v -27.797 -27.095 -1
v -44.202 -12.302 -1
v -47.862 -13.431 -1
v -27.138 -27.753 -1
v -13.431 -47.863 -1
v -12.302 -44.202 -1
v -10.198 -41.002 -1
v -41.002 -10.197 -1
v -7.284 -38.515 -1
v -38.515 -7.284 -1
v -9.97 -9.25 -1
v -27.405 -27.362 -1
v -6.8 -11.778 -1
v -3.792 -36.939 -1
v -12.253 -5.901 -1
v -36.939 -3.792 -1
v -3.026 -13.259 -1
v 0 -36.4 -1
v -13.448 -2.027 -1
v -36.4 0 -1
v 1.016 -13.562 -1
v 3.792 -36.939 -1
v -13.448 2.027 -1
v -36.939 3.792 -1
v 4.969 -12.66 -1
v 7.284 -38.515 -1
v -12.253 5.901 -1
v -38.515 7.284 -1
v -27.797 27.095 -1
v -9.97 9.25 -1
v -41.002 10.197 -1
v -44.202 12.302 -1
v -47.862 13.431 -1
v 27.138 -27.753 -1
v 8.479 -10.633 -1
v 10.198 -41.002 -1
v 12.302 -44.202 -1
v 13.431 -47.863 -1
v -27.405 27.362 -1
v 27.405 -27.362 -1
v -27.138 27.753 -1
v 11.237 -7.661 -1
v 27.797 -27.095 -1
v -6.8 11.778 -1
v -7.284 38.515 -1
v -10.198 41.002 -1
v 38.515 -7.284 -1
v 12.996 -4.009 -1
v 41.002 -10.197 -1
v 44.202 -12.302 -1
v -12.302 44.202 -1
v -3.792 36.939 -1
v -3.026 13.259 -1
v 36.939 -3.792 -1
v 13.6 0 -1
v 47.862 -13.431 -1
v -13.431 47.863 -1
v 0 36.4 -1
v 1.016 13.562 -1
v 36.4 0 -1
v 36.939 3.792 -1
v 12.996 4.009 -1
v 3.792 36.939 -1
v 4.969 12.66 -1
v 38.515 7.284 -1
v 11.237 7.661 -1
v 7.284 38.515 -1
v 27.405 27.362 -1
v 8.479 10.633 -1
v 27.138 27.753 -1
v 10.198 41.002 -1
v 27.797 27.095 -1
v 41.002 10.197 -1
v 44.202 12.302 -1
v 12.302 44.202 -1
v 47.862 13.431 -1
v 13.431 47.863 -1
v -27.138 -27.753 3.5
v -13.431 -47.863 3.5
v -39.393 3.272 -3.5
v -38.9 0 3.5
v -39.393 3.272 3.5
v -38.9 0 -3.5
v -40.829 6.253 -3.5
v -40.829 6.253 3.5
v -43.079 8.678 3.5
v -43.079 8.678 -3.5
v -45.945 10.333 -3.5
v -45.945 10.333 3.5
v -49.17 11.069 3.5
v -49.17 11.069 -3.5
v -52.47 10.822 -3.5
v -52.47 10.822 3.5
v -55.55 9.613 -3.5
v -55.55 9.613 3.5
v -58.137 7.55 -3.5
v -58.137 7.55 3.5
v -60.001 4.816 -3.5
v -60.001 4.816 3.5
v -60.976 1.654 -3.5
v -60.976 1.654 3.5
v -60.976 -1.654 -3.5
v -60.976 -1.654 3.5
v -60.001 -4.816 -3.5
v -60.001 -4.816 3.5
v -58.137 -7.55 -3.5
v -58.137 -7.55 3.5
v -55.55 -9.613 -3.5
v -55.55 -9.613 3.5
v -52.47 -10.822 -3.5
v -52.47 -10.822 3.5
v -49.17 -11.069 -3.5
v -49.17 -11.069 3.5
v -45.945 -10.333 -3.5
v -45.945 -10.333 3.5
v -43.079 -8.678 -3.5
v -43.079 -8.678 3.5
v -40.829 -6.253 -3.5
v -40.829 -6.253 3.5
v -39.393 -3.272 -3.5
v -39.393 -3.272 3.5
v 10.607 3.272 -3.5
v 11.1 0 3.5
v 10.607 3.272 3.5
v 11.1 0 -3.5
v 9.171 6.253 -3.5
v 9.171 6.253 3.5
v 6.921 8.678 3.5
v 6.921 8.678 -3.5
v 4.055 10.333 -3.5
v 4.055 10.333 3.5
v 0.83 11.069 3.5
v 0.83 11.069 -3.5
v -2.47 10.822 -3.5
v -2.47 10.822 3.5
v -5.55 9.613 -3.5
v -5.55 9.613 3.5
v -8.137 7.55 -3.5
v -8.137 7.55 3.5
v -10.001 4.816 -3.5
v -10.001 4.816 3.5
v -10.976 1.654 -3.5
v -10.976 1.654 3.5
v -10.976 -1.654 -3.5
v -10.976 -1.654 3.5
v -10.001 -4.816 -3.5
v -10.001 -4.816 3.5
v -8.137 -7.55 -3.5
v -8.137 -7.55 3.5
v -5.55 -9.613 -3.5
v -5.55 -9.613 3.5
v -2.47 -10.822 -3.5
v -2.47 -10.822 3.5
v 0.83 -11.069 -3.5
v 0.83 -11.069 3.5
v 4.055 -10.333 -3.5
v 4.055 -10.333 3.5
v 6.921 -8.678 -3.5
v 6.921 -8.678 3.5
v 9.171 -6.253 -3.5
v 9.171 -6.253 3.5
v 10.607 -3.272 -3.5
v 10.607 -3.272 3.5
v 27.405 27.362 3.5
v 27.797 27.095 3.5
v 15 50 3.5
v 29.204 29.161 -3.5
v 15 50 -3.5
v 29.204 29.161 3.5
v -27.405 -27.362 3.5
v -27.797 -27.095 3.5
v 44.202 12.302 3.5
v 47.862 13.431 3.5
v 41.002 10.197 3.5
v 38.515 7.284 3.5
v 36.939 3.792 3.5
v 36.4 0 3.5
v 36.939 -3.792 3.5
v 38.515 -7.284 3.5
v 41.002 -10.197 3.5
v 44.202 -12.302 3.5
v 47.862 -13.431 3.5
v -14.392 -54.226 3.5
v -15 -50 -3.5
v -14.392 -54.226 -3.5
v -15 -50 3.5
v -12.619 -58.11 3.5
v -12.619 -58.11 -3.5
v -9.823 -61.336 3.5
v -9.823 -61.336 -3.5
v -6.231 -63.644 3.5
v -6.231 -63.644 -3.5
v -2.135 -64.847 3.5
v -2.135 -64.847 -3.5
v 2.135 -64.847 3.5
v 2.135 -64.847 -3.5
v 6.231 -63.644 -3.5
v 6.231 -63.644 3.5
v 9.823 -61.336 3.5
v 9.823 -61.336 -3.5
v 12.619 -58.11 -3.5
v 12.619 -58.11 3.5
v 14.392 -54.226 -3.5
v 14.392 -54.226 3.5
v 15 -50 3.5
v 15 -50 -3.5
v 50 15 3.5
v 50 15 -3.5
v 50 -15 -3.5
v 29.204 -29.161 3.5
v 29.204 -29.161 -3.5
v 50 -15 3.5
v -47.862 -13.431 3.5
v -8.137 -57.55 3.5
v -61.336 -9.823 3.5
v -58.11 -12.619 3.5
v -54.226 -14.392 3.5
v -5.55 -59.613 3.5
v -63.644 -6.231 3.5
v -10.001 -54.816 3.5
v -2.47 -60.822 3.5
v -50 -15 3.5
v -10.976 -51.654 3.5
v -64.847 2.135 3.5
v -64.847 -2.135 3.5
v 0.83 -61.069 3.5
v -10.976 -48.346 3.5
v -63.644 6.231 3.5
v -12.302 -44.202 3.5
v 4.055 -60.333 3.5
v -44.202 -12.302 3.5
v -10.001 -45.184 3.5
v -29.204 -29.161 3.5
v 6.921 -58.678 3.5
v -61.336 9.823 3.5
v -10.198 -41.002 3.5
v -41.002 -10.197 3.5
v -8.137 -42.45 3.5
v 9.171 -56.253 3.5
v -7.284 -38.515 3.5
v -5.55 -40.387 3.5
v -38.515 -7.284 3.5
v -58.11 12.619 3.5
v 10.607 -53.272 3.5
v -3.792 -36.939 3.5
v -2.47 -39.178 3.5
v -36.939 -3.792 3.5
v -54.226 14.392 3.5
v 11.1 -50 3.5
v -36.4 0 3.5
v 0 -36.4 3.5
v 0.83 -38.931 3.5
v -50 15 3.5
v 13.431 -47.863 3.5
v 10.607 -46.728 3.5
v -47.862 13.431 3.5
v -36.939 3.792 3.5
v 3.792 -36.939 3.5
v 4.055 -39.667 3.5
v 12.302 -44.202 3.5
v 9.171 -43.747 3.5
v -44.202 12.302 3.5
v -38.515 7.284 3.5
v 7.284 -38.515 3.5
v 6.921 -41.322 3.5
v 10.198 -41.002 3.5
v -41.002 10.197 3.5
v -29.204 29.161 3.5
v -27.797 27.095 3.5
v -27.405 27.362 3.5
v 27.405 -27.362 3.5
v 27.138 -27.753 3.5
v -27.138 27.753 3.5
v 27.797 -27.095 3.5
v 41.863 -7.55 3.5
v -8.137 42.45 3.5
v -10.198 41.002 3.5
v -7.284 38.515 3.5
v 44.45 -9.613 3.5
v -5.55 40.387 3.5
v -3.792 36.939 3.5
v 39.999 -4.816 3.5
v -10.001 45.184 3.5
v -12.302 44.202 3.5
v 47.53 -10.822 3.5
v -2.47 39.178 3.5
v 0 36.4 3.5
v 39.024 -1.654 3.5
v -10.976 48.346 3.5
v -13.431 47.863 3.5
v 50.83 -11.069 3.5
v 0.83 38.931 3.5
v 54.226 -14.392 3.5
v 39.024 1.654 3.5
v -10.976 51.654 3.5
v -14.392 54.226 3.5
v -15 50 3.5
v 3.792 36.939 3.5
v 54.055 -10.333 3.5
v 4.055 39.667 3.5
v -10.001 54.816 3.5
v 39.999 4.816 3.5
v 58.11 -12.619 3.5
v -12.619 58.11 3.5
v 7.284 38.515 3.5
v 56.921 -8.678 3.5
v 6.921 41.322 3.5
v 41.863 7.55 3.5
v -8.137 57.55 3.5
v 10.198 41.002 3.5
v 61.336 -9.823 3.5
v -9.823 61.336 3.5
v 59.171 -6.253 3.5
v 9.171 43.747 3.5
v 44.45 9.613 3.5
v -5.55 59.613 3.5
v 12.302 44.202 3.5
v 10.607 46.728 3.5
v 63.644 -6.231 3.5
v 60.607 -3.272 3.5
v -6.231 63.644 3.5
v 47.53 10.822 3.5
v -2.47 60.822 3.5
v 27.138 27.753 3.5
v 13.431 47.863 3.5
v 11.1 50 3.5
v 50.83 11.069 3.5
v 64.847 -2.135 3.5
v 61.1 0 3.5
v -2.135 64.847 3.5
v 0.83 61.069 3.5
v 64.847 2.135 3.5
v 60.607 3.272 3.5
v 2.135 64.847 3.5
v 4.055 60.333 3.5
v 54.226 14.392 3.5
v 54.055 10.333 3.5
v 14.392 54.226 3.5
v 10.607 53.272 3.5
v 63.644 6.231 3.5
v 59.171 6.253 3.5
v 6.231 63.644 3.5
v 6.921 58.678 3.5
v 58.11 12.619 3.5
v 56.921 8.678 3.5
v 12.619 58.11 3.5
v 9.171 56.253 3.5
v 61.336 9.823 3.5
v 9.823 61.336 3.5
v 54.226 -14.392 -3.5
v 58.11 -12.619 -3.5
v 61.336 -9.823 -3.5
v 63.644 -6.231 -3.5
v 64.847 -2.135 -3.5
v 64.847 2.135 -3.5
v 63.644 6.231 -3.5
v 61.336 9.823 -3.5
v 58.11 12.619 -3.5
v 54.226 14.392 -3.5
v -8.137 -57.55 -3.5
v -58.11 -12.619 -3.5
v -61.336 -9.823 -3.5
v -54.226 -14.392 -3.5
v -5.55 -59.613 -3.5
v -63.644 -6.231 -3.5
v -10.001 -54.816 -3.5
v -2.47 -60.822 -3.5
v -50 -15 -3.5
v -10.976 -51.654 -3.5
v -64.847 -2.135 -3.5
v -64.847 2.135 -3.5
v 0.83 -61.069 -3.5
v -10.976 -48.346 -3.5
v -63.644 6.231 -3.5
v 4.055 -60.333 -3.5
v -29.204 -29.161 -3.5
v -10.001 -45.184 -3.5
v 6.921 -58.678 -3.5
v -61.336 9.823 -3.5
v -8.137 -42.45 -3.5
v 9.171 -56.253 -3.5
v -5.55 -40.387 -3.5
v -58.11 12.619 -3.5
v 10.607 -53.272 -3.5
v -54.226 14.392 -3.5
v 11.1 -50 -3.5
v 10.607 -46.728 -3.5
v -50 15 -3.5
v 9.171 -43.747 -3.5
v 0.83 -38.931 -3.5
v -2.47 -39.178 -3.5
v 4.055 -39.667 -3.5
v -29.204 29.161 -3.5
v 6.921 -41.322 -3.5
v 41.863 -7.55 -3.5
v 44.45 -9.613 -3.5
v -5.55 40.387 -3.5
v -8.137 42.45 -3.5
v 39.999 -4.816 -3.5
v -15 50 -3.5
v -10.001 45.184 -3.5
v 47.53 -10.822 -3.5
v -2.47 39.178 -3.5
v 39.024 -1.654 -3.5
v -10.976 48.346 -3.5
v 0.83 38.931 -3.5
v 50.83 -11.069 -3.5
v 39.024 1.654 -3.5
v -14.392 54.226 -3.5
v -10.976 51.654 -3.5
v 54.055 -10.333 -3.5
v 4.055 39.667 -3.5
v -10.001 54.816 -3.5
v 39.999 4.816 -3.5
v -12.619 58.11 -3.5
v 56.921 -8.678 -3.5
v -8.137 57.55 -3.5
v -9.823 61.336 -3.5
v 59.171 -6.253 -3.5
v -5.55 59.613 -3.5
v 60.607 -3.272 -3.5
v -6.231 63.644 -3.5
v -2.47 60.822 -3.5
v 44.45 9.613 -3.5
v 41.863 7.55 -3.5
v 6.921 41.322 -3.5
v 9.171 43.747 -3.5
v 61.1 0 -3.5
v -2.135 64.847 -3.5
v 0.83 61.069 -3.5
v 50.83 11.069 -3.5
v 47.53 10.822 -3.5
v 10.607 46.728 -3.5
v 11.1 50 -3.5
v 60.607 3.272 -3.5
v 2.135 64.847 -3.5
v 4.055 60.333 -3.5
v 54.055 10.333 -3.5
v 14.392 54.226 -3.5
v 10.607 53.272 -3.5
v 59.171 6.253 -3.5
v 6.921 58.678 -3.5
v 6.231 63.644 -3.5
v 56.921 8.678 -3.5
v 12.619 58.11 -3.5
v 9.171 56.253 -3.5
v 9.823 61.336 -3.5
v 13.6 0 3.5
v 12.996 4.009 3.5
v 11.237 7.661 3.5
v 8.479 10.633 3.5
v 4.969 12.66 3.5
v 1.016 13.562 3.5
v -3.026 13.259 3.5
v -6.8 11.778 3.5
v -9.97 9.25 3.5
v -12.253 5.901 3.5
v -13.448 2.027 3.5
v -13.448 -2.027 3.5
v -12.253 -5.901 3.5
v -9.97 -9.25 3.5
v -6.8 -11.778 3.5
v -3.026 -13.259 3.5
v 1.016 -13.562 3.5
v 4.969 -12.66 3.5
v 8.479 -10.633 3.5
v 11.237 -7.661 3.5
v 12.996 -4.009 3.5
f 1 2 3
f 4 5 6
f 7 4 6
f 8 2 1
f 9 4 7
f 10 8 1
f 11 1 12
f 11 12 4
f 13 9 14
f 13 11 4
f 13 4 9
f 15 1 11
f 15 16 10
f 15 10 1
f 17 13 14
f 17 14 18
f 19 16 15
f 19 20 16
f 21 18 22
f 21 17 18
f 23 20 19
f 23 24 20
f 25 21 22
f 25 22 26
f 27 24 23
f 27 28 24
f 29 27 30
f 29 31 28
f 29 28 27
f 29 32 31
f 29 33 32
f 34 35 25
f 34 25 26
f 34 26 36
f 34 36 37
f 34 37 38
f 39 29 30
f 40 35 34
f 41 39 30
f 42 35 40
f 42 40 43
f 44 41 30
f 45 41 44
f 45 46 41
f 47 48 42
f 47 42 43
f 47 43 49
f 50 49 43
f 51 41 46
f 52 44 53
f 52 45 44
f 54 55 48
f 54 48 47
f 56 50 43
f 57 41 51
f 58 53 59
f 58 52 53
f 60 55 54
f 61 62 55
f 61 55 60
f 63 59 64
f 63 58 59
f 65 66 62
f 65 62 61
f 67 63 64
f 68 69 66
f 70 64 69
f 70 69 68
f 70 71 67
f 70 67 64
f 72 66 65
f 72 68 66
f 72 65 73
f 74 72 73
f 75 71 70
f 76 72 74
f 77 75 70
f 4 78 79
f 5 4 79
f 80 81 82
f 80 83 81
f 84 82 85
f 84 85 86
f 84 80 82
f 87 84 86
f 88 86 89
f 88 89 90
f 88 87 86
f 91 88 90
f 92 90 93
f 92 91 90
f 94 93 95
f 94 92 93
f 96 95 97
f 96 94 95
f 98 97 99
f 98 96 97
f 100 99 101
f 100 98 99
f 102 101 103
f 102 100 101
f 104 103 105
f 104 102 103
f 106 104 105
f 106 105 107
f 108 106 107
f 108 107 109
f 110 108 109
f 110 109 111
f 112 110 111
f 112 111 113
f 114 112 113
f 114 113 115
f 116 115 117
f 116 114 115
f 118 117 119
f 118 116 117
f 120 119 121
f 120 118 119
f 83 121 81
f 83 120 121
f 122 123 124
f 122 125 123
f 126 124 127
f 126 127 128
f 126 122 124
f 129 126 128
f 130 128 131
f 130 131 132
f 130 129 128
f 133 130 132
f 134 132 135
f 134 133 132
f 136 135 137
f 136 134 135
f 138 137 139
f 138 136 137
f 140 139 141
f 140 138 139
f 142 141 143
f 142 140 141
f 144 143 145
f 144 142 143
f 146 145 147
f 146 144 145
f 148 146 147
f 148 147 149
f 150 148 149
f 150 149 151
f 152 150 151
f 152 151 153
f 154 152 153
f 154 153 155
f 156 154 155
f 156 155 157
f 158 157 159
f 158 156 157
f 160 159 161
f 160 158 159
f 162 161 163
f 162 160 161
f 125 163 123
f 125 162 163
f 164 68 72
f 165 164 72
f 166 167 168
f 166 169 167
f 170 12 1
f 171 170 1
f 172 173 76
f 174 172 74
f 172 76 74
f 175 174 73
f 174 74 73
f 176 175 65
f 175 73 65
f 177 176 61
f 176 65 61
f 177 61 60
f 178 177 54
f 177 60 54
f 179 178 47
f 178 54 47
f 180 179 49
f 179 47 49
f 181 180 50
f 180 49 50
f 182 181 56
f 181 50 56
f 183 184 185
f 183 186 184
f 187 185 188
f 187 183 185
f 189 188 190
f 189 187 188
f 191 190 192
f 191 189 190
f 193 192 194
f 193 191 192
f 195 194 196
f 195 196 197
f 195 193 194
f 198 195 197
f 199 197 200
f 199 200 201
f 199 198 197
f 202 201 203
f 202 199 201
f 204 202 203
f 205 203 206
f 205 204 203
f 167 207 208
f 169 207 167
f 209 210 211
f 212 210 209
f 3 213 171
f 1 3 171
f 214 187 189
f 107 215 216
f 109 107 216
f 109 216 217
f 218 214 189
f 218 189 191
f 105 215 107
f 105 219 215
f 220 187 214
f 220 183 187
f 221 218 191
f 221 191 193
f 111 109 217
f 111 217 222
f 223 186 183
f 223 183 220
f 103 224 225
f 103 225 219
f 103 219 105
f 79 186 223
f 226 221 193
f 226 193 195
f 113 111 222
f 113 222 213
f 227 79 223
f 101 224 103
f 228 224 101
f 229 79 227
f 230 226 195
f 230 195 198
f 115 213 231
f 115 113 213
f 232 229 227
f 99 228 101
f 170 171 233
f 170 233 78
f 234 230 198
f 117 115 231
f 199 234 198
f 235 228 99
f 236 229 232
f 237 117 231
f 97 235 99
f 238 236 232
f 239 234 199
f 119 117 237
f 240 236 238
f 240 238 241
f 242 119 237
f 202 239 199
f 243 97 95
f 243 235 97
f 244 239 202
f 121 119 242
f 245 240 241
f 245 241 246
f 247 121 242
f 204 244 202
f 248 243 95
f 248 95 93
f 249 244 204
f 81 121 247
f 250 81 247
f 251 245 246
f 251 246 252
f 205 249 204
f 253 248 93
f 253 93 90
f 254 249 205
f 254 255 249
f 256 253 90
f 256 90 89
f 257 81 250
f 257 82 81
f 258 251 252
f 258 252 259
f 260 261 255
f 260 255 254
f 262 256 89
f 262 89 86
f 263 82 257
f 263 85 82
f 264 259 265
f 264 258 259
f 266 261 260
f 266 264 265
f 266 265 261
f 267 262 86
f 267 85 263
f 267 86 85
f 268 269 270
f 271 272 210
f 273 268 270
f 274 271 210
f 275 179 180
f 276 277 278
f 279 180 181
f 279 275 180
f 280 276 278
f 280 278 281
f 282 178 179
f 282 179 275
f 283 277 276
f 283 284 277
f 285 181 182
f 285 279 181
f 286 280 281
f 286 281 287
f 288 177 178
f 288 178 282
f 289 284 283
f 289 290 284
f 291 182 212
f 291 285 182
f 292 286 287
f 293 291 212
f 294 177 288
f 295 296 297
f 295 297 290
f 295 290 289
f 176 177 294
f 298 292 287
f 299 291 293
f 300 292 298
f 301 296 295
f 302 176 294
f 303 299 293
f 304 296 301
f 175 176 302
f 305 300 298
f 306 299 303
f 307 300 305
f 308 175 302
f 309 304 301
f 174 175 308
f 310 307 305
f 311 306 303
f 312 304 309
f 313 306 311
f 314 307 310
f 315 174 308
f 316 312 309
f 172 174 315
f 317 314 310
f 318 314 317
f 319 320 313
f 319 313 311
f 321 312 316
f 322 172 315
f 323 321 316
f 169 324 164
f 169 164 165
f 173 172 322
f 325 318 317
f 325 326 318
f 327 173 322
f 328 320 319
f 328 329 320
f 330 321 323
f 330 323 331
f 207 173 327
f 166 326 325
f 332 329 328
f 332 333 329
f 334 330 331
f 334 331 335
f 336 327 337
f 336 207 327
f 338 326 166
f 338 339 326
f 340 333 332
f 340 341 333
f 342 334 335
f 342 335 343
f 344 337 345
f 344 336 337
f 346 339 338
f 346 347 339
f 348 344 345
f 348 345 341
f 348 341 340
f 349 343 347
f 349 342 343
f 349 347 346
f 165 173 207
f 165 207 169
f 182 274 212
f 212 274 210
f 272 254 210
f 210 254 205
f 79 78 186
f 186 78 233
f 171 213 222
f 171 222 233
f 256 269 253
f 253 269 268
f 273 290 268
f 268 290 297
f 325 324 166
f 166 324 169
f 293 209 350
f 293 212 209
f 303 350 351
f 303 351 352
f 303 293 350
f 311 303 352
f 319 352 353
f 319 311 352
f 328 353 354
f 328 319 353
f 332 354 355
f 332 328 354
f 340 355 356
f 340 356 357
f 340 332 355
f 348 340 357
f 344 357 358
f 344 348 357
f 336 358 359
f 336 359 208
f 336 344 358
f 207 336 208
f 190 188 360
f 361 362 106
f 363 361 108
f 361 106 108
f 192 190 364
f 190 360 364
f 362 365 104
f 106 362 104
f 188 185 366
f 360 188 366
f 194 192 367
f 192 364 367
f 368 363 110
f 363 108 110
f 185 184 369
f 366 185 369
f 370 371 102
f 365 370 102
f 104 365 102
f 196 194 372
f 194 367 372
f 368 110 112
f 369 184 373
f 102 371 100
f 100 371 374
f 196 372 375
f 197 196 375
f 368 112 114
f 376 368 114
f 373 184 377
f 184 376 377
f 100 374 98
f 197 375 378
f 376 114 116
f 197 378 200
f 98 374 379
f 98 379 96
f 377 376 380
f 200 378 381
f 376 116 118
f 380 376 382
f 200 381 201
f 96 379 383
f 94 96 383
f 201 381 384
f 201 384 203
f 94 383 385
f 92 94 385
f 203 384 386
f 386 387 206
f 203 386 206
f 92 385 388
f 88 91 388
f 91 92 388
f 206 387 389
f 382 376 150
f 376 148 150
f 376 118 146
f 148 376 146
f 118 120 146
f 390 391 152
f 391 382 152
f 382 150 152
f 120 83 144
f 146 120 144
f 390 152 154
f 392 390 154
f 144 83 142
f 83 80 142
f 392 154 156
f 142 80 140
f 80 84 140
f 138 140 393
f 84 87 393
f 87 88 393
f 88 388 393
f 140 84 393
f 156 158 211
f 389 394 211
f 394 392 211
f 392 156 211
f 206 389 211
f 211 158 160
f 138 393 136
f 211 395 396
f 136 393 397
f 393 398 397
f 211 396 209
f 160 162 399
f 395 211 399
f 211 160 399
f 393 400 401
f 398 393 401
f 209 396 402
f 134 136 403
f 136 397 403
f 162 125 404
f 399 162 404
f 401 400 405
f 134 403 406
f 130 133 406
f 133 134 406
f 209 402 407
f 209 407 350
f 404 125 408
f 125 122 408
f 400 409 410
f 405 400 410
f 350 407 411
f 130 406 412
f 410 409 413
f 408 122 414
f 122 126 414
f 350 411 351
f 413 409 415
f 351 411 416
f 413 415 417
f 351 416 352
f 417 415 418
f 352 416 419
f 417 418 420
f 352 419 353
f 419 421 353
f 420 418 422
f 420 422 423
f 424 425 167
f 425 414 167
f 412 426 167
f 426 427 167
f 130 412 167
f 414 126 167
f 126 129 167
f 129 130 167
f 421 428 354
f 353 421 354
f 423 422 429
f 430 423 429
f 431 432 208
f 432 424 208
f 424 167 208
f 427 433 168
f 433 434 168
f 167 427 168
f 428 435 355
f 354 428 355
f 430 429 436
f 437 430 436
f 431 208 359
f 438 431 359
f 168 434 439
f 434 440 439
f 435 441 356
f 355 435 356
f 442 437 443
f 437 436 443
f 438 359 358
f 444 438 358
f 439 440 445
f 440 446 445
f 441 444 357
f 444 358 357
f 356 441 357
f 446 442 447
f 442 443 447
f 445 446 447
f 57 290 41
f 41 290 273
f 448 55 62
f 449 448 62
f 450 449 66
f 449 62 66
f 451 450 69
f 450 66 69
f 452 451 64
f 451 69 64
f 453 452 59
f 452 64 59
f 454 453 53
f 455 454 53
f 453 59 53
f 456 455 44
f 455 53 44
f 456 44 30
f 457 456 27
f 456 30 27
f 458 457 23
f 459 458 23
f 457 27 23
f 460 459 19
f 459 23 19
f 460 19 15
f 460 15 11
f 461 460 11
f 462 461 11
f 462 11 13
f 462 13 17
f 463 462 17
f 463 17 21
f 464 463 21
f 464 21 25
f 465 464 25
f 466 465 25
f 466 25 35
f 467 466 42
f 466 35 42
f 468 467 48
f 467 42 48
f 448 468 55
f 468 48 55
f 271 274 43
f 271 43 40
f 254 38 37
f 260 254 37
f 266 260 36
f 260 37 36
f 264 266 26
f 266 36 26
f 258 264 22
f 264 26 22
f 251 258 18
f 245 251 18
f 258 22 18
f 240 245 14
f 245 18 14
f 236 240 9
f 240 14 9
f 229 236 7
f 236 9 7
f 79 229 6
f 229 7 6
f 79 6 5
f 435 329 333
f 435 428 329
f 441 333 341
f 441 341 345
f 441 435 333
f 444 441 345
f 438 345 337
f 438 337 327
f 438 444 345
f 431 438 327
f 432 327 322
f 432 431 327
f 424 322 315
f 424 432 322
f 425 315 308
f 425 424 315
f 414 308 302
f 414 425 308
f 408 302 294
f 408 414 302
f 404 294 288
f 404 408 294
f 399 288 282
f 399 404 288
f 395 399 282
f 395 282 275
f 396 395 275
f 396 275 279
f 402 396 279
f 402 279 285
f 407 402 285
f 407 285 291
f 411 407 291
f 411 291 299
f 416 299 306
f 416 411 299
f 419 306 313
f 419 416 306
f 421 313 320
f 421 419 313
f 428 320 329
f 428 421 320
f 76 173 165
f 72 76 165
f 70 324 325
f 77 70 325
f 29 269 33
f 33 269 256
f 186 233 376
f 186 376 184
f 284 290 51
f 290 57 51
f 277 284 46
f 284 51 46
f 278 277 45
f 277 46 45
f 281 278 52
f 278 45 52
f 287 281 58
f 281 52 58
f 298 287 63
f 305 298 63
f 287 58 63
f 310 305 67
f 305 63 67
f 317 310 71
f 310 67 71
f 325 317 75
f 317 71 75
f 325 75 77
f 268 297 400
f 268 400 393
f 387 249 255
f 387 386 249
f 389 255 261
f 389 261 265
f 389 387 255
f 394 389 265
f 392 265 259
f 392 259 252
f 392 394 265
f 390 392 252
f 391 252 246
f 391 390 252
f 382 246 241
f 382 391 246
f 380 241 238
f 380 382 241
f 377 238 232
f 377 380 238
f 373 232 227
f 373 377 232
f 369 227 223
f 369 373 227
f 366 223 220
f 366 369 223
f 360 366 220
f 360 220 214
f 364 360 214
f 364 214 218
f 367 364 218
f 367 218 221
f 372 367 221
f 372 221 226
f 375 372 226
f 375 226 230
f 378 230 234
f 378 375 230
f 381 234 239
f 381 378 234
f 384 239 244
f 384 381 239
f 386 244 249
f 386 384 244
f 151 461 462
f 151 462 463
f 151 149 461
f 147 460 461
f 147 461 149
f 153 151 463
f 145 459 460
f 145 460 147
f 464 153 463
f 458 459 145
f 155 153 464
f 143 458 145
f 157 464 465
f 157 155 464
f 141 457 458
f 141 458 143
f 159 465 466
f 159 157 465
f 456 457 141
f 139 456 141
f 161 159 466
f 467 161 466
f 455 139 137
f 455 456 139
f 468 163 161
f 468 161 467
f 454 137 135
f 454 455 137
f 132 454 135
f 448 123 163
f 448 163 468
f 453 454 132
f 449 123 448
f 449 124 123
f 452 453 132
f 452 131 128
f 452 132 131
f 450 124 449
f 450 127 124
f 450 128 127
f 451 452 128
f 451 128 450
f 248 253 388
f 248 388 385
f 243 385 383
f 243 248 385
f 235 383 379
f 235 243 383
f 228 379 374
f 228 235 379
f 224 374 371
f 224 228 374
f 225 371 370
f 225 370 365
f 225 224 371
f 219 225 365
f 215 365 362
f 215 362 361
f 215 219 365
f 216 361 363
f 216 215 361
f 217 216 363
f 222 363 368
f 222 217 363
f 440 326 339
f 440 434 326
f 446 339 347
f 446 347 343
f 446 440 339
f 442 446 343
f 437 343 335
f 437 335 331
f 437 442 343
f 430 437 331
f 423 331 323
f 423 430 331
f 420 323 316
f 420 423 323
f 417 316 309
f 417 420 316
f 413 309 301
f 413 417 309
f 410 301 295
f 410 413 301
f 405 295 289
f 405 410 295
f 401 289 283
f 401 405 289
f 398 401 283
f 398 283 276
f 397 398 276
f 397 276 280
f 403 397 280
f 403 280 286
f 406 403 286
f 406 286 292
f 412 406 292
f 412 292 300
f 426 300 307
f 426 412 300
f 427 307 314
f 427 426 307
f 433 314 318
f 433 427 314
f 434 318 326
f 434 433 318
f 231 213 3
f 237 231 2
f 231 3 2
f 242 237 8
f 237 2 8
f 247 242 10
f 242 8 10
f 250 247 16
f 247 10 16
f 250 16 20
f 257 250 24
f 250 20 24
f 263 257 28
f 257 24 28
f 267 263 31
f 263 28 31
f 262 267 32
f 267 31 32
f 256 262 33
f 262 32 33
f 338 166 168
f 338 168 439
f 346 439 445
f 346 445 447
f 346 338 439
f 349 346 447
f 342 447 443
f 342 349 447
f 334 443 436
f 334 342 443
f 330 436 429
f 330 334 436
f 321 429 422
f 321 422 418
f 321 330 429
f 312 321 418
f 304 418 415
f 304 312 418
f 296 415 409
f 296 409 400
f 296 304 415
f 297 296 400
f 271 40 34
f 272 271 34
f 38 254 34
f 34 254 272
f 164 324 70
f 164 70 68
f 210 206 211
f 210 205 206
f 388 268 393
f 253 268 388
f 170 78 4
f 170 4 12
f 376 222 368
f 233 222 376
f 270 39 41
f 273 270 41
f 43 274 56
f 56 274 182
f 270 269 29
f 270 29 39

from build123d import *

# Parameters (mm, degrees)
F0_R        = 11.1
F1_DEPTH    = 3.5
F2_T        = 2.5
F2_T3_DEPTH = 12


# Not quite as in the source:
# - a shell that OpenCascade refuses in one call is made with other operations: the cavity is built on its own and cut out


with BuildPart() as f1:
    # F0 (on Top) → F1 (new body, symmetric)
    with BuildSketch(Plane.XY):
        with BuildLine():
            Line((29.2040910572, 29.1611850262), (15, 50))
            ThreePointArc((15, 50), (0, 35), (-15, 50))
            Line((-15, 50), (-29.2040910572, 29.1611850262))
            Line((-29.2040910572, 29.1611850262), (-50, 15))
            ThreePointArc((-50, 15), (-39.3933982822, 10.6066017178), (-35, 0))
            ThreePointArc((-35, 0), (-39.3933982822, -10.6066017178), (-50, -15))
            Line((-50, -15), (-29.2040910572, -29.1611850262))
            Line((-29.2040910572, -29.1611850262), (-15, -50))
            ThreePointArc((-15, -50), (0, -35), (15, -50))
            Line((15, -50), (29.2040910572, -29.1611850262))
            Line((29.2040910572, -29.1611850262), (50, -15))
            ThreePointArc((50, -15), (35, 0), (50, 15))
            Line((50, 15), (29.2040910572, 29.1611850262))
        make_face()
        Circle(F0_R, mode=Mode.SUBTRACT)
        with BuildLine():
            ThreePointArc((-15, 50), (0, 35), (15, 50))
            ThreePointArc((15, 50), (0, 65), (-15, 50))
        make_face()
        with Locations((0, 50)):
            Circle(F0_R, mode=Mode.SUBTRACT)
        with BuildLine():
            ThreePointArc((65, 0), (60.6066017178, 10.6066017178), (50, 15))
            ThreePointArc((50, 15), (35, 0), (50, -15))
            ThreePointArc((50, -15), (60.6066017178, -10.6066017178), (65, 0))
        make_face()
        with Locations((50, 0)):
            Circle(F0_R, mode=Mode.SUBTRACT)
        with BuildLine():
            ThreePointArc((-15, -50), (0, -65), (15, -50))
            ThreePointArc((15, -50), (0, -35), (-15, -50))
        make_face()
        with Locations((0, -50)):
            Circle(F0_R, mode=Mode.SUBTRACT)
        with BuildLine():
            ThreePointArc((-35, 0), (-39.3933982822, 10.6066017178), (-50, 15))
            ThreePointArc((-50, 15), (-65, 0), (-50, -15))
            ThreePointArc((-50, -15), (-39.3933982822, -10.6066017178), (-35, 0))
        make_face()
        with Locations((-50, 0)):
            Circle(F0_R, mode=Mode.SUBTRACT)
    extrude(amount=F1_DEPTH, both=True)

    # F2: shell of thickness 2.5, made by hand


with BuildPart() as f2_core1:
    # F2_t2: copy of F1
    add(f1.part)

    # the walls: a layer under each face that stays
    f2_faces = [f2_core1.faces().sort_by_distance(p)[0] for p in [
        (39.6020455286, -22.0805925131, 0),
        (22.1020455286, -39.5805925131, 0),
        (0, -65, 0),
        (-22.1020455286, -39.5805925131, 0),
        (-39.6020455286, -22.0805925131, 0),
        (-65, 0, 0),
        (-39.6020455286, 22.0805925131, 0),
        (-22.1020455286, 39.5805925131, 0),
        (0, 65, 0),
        (22.1020455286, 39.5805925131, 0),
        (39.6020455286, 22.0805925131, 0),
        (-61.1, 0, 0),
        (-11.1, -50, 0),
        (38.9, 0, 0),
        (-11.1, 50, 0),
        (-11.1, 0, 0),
        (65, 0, 0),
        (-37.1428571429, -18.5714285714, -3.5),
    ]]
    thicken(f2_faces, amount=-F2_T, mode=Mode.SUBTRACT)

    # F2_s4 → F2_t3 (cut)
    with BuildSketch(Plane.XY.offset(-6)):
        Polygon((50.0140713144, -15.0456639326), (48.5928685595, -12.933606739), (49.2296264469, -12.5), (50, -12.5), align=None)
        Polygon((29.2388199891, -29.1959295426), (27.7969596167, -27.0947917651), (27.4052462259, -27.3615329699), (27.1383293075, -27.753126649), align=None)
        Polygon((15.0456576175, -50.0140805838), (12.9342382503, -48.5919416228), (12.5, -49.2290123454), (12.5, -50), align=None)
        Polygon((-15.0456576175, -50.0140805838), (-12.5, -50), (-12.5, -49.2290123454), (-12.9342382503, -48.5919416228), align=None)
        Polygon((-29.2388199891, -29.1959295426), (-27.1383293075, -27.753126649), (-27.4052462259, -27.3615329699), (-27.7969596167, -27.0947917651), align=None)
        Polygon((-50.0140713144, -15.0456639326), (-48.5928685595, -12.933606739), (-49.2296264469, -12.5), (-50, -12.5), align=None)
        Polygon((-50.0140713144, 15.0456639326), (-50, 12.5), (-49.2296264469, 12.5), (-48.5928685595, 12.933606739), align=None)
        Polygon((-29.2388199891, 29.1959295426), (-27.7969596167, 27.0947917651), (-27.4052462259, 27.3615329699), (-27.1383293075, 27.753126649), align=None)
        Polygon((-15.0456576175, 50.0140805838), (-12.9342382503, 48.5919416228), (-12.5, 49.2290123454), (-12.5, 50), align=None)
        Polygon((15.0456576175, 50.0140805838), (12.5, 50), (12.5, 49.2290123454), (12.9342382503, 48.5919416228), align=None)
        Polygon((29.2388199891, 29.1959295426), (27.1383293075, 27.753126649), (27.4052462259, 27.3615329699), (27.7969596167, 27.0947917651), align=None)
        Polygon((50.0140713144, 15.0456639326), (48.5928685595, 12.933606739), (49.2296264469, 12.5), (50, 12.5), align=None)
    extrude(amount=F2_T3_DEPTH, mode=Mode.SUBTRACT)


with BuildPart() as f1_1:
    add(f1.part)

    # what is left inside the walls is the cavity
    f2_cavity = [f2_core1.part.solids().sort_by_distance(p)[0] for p in [
        (0, -15.95435, 3.475),
    ]]
    add(f2_cavity, mode=Mode.SUBTRACT)


solid = f1_1.part
